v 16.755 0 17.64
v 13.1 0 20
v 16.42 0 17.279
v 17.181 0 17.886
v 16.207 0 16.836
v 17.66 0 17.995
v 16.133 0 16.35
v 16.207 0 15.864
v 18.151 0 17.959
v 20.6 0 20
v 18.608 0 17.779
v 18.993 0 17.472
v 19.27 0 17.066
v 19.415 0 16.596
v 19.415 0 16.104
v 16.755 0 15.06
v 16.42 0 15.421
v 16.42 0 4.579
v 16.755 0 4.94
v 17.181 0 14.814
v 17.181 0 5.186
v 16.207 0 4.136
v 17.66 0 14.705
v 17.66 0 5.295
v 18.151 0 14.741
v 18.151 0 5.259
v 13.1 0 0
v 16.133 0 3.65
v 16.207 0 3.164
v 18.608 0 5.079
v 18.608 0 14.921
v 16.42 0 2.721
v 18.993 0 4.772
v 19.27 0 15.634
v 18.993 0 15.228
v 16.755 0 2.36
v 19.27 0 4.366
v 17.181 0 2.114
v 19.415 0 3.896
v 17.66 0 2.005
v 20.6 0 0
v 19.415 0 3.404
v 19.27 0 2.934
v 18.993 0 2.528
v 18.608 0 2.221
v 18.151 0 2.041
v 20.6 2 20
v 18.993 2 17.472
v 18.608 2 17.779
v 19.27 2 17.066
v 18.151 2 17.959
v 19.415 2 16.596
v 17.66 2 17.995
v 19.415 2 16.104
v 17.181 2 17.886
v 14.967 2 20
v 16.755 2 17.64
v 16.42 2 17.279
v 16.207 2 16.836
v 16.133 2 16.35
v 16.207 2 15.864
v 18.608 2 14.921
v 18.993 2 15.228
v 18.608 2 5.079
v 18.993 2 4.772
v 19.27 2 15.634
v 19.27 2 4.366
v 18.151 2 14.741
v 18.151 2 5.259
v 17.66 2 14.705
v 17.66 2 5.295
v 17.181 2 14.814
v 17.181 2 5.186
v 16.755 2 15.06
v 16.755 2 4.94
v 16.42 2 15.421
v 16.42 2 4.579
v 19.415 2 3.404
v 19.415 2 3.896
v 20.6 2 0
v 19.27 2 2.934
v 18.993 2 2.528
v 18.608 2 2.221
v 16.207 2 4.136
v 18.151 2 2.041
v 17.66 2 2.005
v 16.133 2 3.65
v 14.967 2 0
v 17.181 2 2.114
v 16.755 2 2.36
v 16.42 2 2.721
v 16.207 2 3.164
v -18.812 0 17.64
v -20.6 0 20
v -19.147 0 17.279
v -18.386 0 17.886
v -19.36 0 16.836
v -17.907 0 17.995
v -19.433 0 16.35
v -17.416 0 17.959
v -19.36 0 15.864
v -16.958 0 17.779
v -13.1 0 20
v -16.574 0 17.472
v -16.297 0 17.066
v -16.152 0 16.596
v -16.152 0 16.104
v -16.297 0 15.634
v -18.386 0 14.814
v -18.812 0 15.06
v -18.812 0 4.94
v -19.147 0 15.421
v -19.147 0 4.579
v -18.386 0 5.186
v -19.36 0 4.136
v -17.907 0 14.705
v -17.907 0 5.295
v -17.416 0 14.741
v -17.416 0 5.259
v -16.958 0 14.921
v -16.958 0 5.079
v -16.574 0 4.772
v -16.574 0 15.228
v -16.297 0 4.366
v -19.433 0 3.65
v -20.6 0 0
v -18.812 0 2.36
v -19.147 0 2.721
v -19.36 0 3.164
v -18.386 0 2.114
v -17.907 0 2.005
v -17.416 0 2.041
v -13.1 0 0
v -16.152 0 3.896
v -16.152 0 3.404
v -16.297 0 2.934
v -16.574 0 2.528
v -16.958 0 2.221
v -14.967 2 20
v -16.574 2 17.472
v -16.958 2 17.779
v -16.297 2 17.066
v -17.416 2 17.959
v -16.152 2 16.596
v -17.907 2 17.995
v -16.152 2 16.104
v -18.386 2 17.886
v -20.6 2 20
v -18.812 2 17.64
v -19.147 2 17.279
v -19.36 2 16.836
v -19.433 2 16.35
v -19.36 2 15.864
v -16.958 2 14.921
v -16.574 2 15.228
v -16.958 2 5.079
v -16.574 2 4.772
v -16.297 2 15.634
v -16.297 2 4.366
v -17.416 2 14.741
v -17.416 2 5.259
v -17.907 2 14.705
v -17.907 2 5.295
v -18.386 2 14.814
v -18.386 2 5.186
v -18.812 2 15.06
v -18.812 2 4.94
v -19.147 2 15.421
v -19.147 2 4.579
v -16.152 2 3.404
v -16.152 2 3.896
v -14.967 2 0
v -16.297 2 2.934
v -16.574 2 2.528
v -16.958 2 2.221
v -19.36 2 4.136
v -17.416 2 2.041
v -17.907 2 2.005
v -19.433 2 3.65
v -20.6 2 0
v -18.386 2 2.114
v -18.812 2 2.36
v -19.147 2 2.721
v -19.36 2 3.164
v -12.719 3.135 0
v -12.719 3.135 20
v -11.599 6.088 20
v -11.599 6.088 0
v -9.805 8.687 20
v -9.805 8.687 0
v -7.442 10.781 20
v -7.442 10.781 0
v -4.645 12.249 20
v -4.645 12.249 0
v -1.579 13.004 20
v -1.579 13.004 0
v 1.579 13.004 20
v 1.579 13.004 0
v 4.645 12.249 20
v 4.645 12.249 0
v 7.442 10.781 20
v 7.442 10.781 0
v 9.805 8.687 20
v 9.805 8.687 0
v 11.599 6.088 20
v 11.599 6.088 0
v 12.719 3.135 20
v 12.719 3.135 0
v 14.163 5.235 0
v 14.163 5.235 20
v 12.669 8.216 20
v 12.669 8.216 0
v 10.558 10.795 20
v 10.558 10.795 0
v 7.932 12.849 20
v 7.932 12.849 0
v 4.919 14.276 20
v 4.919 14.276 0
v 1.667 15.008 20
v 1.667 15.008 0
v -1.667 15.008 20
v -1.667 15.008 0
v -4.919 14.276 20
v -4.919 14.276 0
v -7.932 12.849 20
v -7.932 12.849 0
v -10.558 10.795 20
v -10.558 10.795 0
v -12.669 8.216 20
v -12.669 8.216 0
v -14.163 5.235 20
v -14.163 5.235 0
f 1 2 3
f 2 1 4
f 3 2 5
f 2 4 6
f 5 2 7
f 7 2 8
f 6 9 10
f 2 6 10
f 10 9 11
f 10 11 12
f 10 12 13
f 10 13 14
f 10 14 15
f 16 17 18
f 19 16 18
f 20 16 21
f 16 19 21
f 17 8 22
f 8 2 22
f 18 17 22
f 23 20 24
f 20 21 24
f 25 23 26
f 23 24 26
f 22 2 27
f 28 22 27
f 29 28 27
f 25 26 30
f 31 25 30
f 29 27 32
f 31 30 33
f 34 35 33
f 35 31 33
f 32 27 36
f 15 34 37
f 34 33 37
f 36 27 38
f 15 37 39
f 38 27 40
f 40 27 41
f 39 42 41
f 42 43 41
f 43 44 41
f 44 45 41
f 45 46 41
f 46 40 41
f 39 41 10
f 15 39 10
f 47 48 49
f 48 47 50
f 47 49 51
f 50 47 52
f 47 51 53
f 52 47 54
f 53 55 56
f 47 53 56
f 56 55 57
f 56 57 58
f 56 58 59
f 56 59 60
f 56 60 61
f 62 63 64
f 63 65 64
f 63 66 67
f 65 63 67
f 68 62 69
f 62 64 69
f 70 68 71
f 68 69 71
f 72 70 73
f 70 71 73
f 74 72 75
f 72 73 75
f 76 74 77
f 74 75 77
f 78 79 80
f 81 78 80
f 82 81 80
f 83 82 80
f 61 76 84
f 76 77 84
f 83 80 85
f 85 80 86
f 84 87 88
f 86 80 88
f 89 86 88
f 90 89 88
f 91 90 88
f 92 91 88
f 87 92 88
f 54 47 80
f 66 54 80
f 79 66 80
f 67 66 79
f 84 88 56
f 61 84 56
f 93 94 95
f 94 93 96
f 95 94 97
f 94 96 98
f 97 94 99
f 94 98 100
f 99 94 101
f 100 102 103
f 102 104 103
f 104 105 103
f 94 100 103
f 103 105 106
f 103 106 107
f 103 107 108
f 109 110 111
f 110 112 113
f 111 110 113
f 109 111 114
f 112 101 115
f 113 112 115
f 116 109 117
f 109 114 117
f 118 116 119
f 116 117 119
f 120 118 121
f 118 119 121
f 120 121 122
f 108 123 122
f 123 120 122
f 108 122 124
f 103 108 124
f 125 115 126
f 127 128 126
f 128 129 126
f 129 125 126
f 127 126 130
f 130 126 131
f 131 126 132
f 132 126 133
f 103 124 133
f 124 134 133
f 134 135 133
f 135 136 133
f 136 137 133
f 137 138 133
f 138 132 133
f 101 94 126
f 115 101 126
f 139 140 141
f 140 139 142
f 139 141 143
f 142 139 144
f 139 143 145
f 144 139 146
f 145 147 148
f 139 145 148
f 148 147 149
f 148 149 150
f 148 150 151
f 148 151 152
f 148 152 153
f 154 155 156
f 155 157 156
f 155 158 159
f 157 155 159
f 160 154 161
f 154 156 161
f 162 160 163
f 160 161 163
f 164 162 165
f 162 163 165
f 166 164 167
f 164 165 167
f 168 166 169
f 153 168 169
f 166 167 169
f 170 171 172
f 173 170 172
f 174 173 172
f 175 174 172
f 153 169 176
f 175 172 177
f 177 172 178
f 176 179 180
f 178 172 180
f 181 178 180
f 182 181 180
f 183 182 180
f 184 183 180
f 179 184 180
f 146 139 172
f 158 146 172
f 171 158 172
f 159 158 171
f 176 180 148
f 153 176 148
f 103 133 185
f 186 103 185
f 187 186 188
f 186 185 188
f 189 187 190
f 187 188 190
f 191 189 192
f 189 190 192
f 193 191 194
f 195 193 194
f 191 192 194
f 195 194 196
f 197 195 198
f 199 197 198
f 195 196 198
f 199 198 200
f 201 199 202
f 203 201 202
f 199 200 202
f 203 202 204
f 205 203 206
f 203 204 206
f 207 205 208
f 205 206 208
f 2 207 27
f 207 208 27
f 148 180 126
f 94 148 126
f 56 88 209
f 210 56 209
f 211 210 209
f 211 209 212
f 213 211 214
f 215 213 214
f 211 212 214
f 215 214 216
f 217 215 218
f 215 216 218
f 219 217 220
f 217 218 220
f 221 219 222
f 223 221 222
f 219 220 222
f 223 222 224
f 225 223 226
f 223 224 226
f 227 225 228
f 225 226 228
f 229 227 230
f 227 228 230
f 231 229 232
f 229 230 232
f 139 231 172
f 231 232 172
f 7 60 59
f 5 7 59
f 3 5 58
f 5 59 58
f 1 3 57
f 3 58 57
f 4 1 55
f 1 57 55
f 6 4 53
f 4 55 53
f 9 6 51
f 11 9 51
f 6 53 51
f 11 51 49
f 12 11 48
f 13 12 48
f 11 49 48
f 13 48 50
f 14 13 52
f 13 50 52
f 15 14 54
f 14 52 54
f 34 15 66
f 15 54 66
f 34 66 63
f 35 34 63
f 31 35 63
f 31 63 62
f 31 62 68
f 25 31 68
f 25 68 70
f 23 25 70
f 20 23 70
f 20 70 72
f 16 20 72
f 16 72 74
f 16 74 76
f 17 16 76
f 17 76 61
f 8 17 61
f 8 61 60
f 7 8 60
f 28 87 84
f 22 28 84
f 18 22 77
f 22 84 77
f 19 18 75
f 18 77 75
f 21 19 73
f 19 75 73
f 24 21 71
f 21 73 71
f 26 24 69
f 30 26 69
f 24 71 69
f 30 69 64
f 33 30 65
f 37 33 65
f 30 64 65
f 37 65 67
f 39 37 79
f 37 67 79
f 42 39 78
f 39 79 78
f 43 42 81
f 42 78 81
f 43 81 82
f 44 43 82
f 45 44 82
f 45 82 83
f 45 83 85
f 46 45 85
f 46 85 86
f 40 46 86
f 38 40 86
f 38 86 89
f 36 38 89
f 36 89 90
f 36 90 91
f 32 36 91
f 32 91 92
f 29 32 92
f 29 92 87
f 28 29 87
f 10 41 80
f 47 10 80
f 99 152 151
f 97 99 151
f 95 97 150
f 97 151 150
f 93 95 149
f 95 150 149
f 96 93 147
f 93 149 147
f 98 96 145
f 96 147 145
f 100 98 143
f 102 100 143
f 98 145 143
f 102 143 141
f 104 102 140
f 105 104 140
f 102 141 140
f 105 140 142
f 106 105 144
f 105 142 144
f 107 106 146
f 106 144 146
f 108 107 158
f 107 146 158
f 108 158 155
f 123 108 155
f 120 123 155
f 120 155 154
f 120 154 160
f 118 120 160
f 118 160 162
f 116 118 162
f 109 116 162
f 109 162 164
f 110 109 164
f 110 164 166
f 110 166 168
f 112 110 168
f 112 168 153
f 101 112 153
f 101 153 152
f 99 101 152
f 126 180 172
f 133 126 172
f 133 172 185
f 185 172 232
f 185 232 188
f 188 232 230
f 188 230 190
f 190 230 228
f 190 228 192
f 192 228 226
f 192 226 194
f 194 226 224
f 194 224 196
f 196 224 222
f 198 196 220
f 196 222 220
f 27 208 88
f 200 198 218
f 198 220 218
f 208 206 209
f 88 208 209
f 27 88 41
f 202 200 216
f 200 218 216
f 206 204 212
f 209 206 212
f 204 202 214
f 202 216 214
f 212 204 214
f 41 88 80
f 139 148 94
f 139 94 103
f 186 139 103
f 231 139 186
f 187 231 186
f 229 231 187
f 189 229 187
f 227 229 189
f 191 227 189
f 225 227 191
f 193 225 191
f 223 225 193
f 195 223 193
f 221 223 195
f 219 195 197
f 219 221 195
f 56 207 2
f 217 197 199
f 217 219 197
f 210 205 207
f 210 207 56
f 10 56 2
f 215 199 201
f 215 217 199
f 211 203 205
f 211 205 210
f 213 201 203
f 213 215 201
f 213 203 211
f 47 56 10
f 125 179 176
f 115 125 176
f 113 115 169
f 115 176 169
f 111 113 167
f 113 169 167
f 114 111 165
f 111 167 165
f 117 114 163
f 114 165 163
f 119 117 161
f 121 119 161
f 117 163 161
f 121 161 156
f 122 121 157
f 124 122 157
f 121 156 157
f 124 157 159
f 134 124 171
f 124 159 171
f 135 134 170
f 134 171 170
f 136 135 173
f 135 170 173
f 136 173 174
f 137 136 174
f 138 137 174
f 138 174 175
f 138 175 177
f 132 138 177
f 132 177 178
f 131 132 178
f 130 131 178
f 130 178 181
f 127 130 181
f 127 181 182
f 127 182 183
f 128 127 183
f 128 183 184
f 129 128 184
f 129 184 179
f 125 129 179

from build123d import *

# Parameters (mm, degrees)
F1_DEPTH = 20
F3_R     = 1.65
F4_DEPTH = 25
F2_R     = 1.65
F5_DEPTH = 25


with BuildPart() as f1:
    # F0 (on Top) → F1 (new body)
    with BuildSketch(Plane.XY):
        with BuildLine():
            ThreePointArc((-13.1, 0), (0, 13.1), (13.1, 0))
            Line((13.1, 0), (20.6, 0))
            Line((20.6, 0), (20.6, 2))
            Line((20.6, 2), (14.966964, 2))
            ThreePointArc((14.966964, 2), (0, 15.1), (-14.966964, 2))
            Line((-14.966964, 2), (-20.6, 2))
            Line((-20.6, 2), (-20.6, 0))
            Line((-20.6, 0), (-13.1, 0))
        make_face()
    extrude(amount=F1_DEPTH)

    # F3 (on face) → F4 (cut)
    with BuildSketch(Plane(origin=(0, 2, 0), x_dir=(-1, 0, 0), z_dir=(0, 1, 0))):
        with Locations((17.783482, 16.35)):
            Circle(F3_R)
        with Locations((17.783482, 3.65)):
            Circle(F3_R)
    extrude(amount=-F4_DEPTH, mode=Mode.SUBTRACT)

    # F2 (on face) → F5 (cut)
    with BuildSketch(Plane(origin=(0, 2, 0), x_dir=(-1, 0, 0), z_dir=(0, 1, 0))):
        with Locations((-17.783482, 16.35)):
            Circle(F2_R)
        with Locations((-17.783482, 3.65)):
            Circle(F2_R)
    extrude(amount=-F5_DEPTH, mode=Mode.SUBTRACT)


solid = f1.part
